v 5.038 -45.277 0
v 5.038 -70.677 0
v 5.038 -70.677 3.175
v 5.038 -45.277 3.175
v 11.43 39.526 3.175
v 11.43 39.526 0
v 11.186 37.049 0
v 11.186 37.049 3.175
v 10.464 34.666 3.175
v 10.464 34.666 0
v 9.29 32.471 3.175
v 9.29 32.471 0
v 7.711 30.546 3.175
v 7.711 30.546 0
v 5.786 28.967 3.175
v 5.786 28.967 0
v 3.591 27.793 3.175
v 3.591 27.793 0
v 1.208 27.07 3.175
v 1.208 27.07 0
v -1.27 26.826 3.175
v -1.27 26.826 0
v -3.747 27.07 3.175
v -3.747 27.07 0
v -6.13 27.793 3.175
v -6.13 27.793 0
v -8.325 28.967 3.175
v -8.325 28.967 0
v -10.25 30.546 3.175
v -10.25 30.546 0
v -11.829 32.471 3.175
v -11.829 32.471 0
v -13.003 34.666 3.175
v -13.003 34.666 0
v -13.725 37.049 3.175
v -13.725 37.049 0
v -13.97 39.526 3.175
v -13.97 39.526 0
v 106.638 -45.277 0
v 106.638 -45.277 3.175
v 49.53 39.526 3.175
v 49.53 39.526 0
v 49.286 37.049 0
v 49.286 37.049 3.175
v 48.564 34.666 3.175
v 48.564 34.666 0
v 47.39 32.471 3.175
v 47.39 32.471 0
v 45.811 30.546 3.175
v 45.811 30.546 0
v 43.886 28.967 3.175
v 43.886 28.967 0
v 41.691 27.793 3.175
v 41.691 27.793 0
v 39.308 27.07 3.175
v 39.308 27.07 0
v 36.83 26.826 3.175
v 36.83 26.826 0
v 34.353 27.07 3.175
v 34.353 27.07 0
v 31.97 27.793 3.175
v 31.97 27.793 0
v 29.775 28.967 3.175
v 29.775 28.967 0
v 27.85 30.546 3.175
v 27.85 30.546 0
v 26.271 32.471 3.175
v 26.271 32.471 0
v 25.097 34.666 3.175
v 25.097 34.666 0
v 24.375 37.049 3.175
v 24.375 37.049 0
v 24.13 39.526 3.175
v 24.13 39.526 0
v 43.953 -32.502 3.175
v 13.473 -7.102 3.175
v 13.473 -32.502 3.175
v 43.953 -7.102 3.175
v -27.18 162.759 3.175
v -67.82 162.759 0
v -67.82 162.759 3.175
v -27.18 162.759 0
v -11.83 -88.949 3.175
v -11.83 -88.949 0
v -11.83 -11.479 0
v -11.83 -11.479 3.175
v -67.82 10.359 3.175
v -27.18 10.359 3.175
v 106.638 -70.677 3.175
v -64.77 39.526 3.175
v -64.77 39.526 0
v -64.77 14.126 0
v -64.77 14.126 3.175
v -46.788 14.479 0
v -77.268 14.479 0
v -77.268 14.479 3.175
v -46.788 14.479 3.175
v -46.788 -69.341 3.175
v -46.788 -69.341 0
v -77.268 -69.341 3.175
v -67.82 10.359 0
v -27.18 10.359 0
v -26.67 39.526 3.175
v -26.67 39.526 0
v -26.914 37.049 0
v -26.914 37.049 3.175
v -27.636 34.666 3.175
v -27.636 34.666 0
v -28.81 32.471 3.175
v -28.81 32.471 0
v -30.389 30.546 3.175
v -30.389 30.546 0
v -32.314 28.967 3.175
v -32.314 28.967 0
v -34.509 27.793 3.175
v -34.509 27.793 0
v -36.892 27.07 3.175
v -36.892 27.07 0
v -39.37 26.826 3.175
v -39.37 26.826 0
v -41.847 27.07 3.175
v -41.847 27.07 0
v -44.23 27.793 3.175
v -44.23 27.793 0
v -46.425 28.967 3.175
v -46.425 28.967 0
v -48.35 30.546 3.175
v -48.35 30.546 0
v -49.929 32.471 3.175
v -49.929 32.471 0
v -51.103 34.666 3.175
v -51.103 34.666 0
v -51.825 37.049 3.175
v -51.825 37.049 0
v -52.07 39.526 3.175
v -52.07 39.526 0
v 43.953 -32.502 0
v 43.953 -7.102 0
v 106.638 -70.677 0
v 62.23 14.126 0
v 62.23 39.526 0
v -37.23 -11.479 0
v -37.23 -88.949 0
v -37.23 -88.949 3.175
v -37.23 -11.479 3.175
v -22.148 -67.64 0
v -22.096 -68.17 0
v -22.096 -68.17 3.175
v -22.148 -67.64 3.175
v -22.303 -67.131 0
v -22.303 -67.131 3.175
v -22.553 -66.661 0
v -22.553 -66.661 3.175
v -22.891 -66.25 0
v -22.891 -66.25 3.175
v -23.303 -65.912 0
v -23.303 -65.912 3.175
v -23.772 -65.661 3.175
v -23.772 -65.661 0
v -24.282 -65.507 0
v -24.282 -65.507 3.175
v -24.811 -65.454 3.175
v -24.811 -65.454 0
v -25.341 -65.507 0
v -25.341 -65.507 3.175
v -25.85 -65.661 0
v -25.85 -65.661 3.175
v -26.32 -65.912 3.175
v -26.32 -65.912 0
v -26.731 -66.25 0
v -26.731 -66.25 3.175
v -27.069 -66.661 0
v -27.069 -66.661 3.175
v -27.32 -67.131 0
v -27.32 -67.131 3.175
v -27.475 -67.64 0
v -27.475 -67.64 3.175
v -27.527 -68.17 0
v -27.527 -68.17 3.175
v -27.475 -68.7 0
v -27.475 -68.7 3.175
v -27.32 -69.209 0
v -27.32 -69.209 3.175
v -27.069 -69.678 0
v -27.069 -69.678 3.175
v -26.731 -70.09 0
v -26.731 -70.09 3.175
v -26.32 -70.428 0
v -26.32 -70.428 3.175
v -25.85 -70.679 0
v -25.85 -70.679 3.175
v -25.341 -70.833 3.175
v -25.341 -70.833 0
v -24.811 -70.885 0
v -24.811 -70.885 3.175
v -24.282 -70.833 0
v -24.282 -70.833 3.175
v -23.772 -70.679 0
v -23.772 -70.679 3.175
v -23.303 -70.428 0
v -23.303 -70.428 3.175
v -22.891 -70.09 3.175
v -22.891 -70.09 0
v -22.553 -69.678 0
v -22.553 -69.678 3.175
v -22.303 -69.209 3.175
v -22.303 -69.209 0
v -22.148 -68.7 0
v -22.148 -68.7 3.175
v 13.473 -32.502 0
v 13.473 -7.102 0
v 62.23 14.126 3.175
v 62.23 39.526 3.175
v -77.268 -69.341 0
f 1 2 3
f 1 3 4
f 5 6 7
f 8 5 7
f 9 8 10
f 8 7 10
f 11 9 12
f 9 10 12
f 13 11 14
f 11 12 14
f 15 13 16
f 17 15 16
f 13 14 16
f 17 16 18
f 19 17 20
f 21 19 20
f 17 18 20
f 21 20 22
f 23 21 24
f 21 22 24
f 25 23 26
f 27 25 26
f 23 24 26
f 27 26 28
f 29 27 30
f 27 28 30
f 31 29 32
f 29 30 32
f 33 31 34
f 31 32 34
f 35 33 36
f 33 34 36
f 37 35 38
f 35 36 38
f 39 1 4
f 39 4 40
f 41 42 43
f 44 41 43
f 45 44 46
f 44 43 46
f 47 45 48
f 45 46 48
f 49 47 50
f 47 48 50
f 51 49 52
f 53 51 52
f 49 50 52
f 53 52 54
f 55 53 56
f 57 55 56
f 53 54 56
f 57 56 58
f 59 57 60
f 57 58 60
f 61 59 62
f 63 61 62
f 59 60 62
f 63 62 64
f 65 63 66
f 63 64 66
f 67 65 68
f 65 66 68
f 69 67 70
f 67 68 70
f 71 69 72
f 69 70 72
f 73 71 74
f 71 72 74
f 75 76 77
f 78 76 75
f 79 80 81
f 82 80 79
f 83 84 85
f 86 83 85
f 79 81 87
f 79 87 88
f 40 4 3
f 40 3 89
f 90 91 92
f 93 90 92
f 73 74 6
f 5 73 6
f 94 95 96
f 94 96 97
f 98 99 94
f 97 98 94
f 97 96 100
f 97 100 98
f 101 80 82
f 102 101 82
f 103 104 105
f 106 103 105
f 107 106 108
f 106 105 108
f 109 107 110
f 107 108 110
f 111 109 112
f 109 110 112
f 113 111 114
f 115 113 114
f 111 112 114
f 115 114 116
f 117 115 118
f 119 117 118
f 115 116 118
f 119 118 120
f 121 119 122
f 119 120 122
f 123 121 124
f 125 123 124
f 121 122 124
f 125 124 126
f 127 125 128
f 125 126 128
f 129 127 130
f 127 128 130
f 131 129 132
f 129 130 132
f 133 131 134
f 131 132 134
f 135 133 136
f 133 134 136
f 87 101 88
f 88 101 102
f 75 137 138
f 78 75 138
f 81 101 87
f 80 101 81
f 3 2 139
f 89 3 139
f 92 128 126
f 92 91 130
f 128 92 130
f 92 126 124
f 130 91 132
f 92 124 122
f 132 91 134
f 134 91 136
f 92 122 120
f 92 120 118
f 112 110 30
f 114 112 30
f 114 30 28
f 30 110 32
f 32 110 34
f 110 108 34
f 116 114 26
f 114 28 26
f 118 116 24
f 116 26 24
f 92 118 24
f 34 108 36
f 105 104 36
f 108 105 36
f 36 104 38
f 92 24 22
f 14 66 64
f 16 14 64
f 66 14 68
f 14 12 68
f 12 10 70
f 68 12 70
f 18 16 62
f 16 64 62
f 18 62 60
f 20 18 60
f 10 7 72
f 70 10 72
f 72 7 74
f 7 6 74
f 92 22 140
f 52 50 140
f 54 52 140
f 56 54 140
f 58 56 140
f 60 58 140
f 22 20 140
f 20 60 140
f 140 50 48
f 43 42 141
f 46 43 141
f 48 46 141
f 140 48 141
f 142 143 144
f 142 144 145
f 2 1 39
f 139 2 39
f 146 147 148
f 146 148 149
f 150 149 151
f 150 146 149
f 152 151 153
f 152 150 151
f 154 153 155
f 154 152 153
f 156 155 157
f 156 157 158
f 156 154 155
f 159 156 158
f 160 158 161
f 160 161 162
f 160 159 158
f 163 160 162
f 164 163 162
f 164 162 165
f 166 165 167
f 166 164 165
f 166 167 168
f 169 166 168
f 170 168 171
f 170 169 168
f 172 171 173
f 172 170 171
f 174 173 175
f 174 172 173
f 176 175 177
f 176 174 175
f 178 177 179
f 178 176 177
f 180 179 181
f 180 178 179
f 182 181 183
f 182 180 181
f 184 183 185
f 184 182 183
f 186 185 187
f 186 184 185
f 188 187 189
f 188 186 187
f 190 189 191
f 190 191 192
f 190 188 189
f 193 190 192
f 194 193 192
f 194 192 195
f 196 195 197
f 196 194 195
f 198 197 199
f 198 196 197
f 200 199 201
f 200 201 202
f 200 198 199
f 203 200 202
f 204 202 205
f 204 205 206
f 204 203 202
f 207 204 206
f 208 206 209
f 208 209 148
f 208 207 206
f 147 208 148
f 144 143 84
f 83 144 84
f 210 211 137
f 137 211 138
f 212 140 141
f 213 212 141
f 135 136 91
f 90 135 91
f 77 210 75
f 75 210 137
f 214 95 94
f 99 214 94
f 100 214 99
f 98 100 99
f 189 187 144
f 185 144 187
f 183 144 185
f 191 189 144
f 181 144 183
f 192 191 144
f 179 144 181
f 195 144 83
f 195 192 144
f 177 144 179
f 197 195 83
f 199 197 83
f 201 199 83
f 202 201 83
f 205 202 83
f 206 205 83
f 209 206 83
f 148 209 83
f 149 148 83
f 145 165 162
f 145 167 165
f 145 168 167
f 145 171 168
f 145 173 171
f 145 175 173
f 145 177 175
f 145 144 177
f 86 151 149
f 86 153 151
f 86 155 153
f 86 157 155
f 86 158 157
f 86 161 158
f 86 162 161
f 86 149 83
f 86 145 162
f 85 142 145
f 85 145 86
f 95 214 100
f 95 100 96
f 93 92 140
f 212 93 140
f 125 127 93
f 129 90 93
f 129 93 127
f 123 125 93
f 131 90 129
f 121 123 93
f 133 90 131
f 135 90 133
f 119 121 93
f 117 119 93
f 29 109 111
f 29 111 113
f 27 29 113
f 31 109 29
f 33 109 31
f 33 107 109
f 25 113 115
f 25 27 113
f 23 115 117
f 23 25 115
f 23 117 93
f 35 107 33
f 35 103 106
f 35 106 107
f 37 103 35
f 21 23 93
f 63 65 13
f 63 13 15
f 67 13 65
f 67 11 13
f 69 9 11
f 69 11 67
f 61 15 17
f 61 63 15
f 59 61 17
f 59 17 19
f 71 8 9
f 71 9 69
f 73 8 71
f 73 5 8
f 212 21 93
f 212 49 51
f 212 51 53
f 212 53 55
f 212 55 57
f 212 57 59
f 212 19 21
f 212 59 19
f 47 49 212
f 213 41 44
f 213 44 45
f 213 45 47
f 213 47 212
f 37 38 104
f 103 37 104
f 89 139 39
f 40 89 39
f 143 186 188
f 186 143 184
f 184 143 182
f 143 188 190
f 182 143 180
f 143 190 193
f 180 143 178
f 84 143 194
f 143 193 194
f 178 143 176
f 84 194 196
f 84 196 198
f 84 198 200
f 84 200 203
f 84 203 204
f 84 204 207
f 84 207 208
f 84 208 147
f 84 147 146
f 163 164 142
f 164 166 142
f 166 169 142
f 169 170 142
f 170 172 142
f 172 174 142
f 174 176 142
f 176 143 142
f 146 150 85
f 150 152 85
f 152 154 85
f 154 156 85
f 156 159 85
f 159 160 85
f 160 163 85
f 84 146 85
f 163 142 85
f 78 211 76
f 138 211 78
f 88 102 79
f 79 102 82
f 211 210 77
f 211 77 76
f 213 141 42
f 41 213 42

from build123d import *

# Parameters (mm, degrees)
F1_DEPTH  = 3.175
F2_W      = 30.48
F2_H      = 83.82
F3_DEPTH  = 3.175
F4_W      = 25.4
F4_H      = 77.47
F4_R      = 2.7154298689
F5_DEPTH  = 3.175
F6_W      = 30.48
F6_H      = 25.4
F7_DEPTH  = 3.175
F8_W      = 101.6
F8_H      = 25.4
F9_DEPTH  = 3.175
F10_W     = 40.64
F10_H     = 152.4
F11_DEPTH = 3.175


# Not quite as in the source:
# - a length typed as a fraction of an inch, garbled in the dataset ("3 / 203.2 mm" for 3/8 in), is restored


with BuildPart() as f1:
    # F0 (on Top) → F1 (new body)
    with BuildSketch(Plane.XY):
        with BuildLine():
            Line((-52.0695035428, 39.5263851967), (-64.7695035428, 39.5263851967))
            Line((-64.7695035428, 39.5263851967), (-64.7695035428, 14.1263851967))
            Line((-64.7695035428, 14.1263851967), (62.2304964572, 14.1263851967))
            Line((62.2304964572, 14.1263851967), (62.2304964572, 39.5263851967))
            Line((62.2304964572, 39.5263851967), (49.5304964572, 39.5263851967))
            ThreePointArc((49.5304964572, 39.5263851967), (36.8304964572, 26.8263851967), (24.1304964572, 39.5263851967))
            Line((24.1304964572, 39.5263851967), (11.4304964572, 39.5263851967))
            ThreePointArc((11.4304964572, 39.5263851967), (-1.2695035428, 26.8263851967), (-13.9695035428, 39.5263851967))
            Line((-13.9695035428, 39.5263851967), (-26.6695035428, 39.5263851967))
            ThreePointArc((-26.6695035428, 39.5263851967), (-39.3695035428, 26.8263851967), (-52.0695035428, 39.5263851967))
        make_face()
    extrude(amount=F1_DEPTH)


with BuildPart() as f3:
    # F2 (on Top) → F3 (new body)
    with BuildSketch(Plane.XY):
        with Locations((-62.027904564, -27.4314320334)):
            Rectangle(F2_W, F2_H)
    extrude(amount=F3_DEPTH)


with BuildPart() as f5:
    # F4 (on Top) → F5 (new body)
    with BuildSketch(Plane.XY):
        with Locations((-24.5303590782, -50.2138879341)):
            Rectangle(F4_W, F4_H)
        with Locations((-24.811277166, -68.1698620319)):
            Circle(F4_R, mode=Mode.SUBTRACT)
    extrude(amount=F5_DEPTH)


with BuildPart() as f7:
    # F6 (on Top) → F7 (new body)
    with BuildSketch(Plane.XY):
        with Locations((28.7132419021, -19.8017735619)):
            Rectangle(F6_W, F6_H)
    extrude(amount=F7_DEPTH)


with BuildPart() as f9:
    # F8 (on Top) → F9 (new body)
    with BuildSketch(Plane.XY):
        with Locations((55.8379401919, -57.9767658847)):
            Rectangle(F8_W, F8_H)
    extrude(amount=F9_DEPTH)


with BuildPart() as f11:
    # F10 (on Top) → F11 (new body)
    with BuildSketch(Plane.XY):
        with Locations((-47.5000926219, 86.5590404719)):
            Rectangle(F10_W, F10_H)
    extrude(amount=F11_DEPTH)


solid = Compound([f1.part, f3.part, f5.part, f7.part, f9.part, f11.part])
